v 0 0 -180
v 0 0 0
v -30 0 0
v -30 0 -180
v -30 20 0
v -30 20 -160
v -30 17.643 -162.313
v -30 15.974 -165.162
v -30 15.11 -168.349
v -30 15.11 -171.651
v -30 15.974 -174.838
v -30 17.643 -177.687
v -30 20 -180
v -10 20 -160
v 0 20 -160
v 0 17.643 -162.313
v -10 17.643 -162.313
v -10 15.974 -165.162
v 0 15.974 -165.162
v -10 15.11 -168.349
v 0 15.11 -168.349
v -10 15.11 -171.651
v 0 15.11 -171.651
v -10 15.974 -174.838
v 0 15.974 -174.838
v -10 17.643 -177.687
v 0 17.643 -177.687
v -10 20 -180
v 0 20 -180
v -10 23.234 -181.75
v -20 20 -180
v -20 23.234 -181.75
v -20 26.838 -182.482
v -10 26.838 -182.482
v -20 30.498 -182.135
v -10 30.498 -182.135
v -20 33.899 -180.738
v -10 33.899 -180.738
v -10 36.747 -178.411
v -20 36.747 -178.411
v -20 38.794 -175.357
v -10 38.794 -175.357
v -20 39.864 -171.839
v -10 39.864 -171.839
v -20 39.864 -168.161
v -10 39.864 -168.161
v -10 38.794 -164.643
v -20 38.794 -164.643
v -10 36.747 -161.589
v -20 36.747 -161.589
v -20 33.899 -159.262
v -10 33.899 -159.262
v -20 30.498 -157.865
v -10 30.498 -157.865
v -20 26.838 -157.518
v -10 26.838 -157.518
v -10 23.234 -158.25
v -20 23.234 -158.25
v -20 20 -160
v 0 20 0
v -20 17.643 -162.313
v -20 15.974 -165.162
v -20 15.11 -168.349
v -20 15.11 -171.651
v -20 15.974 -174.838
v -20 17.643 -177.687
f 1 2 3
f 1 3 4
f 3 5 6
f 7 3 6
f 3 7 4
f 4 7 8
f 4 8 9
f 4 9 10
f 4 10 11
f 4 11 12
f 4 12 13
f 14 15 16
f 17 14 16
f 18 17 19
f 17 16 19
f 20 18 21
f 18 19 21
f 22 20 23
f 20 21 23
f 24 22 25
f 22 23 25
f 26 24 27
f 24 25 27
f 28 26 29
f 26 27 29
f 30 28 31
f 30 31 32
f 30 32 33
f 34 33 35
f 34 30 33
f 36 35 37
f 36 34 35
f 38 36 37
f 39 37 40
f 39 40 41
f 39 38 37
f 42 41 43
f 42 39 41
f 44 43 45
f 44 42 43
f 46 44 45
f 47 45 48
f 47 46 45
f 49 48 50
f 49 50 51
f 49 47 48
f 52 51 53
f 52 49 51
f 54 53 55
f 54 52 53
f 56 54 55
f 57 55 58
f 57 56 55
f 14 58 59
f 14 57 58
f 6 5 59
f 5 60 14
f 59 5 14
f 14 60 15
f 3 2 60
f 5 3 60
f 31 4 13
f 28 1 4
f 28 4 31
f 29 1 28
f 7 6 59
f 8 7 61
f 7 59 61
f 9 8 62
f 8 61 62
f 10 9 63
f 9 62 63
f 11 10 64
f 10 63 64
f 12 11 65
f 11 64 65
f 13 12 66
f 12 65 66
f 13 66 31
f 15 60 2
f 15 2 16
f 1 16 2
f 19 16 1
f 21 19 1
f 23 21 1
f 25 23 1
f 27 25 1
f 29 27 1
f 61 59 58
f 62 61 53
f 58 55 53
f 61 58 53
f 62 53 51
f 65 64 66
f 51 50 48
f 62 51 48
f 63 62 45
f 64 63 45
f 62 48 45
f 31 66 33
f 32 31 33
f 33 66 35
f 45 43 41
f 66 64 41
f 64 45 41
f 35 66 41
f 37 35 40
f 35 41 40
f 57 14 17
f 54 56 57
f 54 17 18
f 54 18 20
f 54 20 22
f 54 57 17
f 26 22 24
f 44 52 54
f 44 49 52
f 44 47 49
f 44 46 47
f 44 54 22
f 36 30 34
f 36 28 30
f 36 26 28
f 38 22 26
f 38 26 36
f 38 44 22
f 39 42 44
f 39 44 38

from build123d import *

# Parameters (mm, degrees)
SKETCH2_W           = 180
SKETCH2_H           = 20
BOSS_EXTRUDE1_DEPTH = 30
SKETCH3_R           = 12.5
CUT_EXTRUDE2_DEPTH  = 31
SKETCH5_R           = 12.5
BOSS_EXTRUDE4_DEPTH = 5


with BuildPart() as part:
    # Sketch2 → Boss-Extrude1 (new body)
    with BuildSketch(Plane(origin=(0, 0, 0), x_dir=(0, 0, -1), z_dir=(1, 0, 0))):
        with Locations((90, 10)):
            Rectangle(SKETCH2_W, SKETCH2_H)
    extrude(amount=-BOSS_EXTRUDE1_DEPTH)

    # Sketch3 → Cut-Extrude2 (cut, through all)
    with BuildSketch(Plane(origin=(0, 0, 0), x_dir=(0, 0, -1), z_dir=(1, 0, 0))):
        with Locations((170, 27.5)):
            Circle(SKETCH3_R)
    extrude(amount=-CUT_EXTRUDE2_DEPTH, mode=Mode.SUBTRACT)

    # Sketch5 → Boss-Extrude4 (add, symmetric)
    with BuildSketch(Plane(origin=(-15, 0, 0), x_dir=(0, 0, -1), z_dir=(1, 0, 0))):
        with Locations((170, 27.5)):
            Circle(SKETCH5_R)
    extrude(amount=BOSS_EXTRUDE4_DEPTH, both=True)


solid = part.part
